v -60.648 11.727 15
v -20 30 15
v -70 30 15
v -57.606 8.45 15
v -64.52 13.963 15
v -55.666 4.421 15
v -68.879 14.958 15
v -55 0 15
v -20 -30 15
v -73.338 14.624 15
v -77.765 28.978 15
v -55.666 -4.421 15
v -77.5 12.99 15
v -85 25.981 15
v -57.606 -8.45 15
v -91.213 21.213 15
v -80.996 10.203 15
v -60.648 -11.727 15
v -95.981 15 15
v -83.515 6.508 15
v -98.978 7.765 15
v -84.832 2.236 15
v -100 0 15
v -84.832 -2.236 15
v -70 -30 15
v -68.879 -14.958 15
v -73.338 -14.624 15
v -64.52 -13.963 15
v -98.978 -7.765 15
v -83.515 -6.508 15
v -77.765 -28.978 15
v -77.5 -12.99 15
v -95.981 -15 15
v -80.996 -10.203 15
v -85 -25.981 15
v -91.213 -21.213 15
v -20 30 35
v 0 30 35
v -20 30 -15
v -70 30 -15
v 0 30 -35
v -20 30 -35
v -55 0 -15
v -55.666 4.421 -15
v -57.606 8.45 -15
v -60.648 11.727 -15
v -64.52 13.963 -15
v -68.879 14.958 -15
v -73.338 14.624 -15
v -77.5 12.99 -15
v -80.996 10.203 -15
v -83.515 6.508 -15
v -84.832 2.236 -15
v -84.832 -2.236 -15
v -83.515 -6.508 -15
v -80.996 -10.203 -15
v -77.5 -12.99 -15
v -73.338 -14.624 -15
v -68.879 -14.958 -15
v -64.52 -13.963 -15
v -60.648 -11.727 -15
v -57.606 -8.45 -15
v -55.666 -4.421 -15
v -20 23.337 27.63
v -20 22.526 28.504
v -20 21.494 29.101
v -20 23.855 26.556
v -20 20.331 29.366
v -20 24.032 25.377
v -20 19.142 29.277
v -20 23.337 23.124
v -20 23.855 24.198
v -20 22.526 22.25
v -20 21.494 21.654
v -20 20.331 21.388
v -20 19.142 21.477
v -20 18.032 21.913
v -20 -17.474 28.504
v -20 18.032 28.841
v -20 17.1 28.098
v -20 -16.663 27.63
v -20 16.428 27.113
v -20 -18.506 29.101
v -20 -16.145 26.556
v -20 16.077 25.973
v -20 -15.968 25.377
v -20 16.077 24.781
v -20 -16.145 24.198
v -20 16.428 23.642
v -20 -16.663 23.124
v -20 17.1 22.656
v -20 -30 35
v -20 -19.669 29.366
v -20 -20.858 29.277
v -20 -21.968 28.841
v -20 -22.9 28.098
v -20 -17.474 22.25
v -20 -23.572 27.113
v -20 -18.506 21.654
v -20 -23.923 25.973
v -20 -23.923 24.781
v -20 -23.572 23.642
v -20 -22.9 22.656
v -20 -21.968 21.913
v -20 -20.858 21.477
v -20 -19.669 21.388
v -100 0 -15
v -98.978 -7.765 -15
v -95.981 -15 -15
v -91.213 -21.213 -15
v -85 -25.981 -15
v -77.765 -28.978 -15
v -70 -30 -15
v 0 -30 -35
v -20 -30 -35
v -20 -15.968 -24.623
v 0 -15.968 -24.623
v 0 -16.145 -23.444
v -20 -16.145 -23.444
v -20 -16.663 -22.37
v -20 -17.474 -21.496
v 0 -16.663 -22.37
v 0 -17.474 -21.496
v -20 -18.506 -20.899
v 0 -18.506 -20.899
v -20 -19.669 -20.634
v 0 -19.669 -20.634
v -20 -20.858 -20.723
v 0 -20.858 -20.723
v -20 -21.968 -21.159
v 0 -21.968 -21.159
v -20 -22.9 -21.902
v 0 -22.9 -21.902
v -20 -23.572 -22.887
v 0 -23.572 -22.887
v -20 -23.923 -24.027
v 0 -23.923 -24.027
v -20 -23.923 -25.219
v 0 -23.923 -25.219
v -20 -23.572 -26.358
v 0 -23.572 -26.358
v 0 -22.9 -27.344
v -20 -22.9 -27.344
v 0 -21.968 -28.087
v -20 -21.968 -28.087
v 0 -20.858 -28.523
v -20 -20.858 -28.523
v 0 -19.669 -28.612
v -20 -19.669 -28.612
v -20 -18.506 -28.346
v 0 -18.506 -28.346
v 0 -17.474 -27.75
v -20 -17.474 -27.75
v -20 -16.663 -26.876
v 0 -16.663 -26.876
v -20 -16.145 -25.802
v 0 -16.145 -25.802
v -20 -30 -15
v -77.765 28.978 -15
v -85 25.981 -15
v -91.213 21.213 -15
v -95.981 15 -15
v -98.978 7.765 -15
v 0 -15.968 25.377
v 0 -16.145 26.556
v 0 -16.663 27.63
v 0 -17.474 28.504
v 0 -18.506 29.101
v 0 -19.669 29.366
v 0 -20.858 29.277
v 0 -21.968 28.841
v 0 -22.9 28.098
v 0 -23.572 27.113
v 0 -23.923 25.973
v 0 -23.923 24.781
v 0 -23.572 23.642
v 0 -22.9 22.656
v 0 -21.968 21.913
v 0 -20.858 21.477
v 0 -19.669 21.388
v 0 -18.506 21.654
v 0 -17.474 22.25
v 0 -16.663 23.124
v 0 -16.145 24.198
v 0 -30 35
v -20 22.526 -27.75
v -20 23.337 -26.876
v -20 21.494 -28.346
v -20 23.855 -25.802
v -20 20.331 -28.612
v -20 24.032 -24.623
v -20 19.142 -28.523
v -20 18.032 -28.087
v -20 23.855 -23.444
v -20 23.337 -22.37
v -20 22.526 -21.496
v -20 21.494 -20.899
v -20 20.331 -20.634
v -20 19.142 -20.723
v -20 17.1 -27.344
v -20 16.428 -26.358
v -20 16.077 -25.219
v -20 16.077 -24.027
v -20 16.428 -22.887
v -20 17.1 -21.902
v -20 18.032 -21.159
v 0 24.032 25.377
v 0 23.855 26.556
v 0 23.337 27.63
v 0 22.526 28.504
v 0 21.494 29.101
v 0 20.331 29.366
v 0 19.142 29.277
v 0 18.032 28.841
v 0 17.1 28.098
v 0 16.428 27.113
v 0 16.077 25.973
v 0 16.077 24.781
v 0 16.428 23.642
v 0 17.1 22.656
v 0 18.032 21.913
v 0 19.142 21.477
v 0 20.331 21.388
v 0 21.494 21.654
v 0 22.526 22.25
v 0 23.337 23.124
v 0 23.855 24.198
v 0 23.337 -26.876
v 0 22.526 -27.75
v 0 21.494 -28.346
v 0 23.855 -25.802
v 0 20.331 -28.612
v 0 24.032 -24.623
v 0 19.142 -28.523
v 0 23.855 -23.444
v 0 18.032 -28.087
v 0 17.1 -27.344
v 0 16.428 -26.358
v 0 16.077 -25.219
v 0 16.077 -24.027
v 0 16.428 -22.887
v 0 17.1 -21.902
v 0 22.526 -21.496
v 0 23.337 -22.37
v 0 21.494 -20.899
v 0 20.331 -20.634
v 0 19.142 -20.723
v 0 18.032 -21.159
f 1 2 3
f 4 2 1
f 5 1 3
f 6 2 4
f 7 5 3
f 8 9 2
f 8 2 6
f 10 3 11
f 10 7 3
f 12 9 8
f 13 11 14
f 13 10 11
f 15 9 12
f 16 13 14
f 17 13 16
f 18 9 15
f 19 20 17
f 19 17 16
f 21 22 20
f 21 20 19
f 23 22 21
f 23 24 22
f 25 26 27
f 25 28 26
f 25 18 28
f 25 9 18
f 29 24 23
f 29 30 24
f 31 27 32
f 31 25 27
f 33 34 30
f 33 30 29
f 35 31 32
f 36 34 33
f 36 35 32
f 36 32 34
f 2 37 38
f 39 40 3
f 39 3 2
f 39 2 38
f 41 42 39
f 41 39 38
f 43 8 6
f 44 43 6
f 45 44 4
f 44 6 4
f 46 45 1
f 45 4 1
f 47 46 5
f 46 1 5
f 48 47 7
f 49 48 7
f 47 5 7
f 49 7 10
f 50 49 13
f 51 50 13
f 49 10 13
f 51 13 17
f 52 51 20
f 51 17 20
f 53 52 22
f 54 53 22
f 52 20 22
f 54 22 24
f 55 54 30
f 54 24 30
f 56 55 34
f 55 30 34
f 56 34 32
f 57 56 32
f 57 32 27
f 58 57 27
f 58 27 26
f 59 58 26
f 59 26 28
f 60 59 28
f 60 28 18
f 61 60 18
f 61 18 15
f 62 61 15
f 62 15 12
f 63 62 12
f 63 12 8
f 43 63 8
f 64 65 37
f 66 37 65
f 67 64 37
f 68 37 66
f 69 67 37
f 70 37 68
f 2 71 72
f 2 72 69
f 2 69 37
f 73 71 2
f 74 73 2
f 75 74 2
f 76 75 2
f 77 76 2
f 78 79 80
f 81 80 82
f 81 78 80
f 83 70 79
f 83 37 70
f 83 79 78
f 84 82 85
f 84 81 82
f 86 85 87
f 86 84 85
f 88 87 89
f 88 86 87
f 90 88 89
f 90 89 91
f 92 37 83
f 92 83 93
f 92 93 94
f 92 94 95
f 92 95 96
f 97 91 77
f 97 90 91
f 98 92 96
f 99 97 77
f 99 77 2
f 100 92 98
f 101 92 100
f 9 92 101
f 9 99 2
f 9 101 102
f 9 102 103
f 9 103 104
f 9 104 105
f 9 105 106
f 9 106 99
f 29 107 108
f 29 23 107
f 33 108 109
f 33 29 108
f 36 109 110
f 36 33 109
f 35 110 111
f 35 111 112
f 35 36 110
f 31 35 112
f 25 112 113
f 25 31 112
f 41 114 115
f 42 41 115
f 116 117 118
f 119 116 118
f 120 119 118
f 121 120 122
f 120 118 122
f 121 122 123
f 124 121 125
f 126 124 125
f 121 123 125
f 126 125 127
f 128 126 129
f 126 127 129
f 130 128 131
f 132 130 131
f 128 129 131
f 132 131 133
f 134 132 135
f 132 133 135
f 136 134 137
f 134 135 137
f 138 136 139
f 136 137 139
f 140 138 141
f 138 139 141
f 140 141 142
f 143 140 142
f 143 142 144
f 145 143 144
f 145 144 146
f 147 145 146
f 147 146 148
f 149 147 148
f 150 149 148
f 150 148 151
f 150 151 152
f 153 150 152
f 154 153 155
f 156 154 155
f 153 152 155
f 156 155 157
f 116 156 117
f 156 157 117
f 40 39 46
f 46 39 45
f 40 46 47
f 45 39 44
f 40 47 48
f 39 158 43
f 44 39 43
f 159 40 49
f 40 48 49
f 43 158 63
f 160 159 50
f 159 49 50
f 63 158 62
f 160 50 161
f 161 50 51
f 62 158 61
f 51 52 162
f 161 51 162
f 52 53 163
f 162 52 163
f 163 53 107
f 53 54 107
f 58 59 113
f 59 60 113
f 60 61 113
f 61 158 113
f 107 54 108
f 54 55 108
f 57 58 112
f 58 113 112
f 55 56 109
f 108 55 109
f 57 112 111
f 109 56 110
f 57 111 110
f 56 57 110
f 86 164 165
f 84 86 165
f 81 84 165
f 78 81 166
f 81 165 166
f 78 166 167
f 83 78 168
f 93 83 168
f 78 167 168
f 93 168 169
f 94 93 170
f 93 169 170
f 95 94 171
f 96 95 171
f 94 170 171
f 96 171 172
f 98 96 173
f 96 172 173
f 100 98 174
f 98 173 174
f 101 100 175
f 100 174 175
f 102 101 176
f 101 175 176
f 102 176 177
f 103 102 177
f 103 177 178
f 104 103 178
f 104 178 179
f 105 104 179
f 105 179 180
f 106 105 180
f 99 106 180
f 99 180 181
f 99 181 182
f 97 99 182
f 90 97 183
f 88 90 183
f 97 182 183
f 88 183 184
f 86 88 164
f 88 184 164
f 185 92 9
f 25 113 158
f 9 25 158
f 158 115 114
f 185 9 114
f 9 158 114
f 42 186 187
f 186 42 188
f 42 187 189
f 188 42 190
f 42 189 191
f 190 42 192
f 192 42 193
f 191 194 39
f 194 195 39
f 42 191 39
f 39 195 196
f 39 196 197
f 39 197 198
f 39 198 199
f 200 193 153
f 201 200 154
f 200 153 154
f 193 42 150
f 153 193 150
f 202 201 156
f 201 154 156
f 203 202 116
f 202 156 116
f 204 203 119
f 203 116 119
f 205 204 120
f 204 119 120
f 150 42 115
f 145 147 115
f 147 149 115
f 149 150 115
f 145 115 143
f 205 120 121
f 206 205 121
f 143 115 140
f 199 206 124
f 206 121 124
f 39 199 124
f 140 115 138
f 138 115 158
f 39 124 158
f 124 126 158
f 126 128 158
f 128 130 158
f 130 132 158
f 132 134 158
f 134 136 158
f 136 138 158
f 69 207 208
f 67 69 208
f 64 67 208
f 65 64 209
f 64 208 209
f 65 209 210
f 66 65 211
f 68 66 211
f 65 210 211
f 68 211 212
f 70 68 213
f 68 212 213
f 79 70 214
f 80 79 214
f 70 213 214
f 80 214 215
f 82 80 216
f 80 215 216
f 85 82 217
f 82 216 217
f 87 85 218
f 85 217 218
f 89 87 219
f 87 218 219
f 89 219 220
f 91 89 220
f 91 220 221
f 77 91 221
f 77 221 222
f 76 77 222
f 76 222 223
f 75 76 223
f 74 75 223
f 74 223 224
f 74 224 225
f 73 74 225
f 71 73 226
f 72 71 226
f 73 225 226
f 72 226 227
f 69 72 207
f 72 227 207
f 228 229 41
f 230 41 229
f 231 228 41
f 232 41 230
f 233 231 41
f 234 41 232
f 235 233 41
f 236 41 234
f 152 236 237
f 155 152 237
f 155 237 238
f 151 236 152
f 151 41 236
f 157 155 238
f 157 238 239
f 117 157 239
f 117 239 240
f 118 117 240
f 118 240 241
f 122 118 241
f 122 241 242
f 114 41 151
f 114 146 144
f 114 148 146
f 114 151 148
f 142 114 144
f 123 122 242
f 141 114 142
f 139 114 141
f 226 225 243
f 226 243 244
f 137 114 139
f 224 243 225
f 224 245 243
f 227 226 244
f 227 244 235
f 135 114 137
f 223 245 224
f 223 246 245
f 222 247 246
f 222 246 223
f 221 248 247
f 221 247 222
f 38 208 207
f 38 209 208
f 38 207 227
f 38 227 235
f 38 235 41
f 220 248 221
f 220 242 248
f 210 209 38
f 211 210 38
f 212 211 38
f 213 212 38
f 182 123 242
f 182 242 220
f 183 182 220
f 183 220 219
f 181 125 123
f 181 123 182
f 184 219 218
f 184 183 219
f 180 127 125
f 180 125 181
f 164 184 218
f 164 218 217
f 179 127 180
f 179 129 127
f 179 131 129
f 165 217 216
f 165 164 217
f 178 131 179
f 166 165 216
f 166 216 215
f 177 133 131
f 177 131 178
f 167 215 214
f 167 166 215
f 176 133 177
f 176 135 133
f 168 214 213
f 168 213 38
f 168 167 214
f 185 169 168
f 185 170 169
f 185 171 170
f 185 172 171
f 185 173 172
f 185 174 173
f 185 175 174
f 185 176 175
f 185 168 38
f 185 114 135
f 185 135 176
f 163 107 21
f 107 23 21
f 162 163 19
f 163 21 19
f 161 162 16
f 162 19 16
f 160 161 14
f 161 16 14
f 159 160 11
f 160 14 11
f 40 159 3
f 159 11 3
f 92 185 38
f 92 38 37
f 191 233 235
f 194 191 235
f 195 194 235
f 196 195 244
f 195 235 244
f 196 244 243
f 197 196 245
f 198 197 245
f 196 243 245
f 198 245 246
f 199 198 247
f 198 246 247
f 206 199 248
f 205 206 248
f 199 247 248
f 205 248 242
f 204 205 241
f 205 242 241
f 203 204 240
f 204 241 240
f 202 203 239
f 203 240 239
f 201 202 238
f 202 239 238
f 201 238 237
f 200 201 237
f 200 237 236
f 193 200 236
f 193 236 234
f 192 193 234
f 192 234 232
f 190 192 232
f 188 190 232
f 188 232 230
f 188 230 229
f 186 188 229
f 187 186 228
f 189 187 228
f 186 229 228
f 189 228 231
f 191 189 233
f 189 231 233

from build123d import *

# Parameters (mm, degrees)
F1_DEPTH = 30
F2_R     = 30
F3_R     = 29.99999
F4_R     = 15
F5_DEPTH = 15
F7_R     = 4
F8_DEPTH = 20


# Not quite as in the source:
# - a fillet or chamfer is up to 0.001 mm smaller than in the source, because OpenCascade refuses the exact size


with BuildPart() as f1:
    # F0 (on Front) → F1 (new body, symmetric)
    with BuildSketch(Plane.XZ):
        Polygon((-100, 0), (0, 0), (0, 35), (-20, 35), (-20, 15), (-100, 15), align=None)
    extrude(amount=F1_DEPTH, both=True)

    # F2
    f2_edges = [f1.edges().sort_by_distance(p)[0] for p in [
        (-100, -30, 7.5),
    ]]
    fillet(f2_edges, radius=F2_R)

    # F3 (radius 30 in the source; OpenCascade refuses exactly that, so slightly less here)
    f3_edges = [f1.edges().sort_by_distance(p)[0] for p in [
        (-100, 30, 7.5),
    ]]
    fillet(f3_edges, radius=F3_R)

    # F4 (on face) → F5 (cut, through all)
    with BuildSketch(Plane.XY.offset(15)):
        with Locations((-70, 0)):
            Circle(F4_R)
    extrude(amount=-F5_DEPTH, mode=Mode.SUBTRACT)

    # F6: F1 across plane


with BuildPart() as f1_1:
    add(f1.part)
    add(f1.part.mirror(Plane.XY))

    # F7 (on Right) → F8 (cut, through all)
    with BuildSketch(Plane.YZ):
        with Locations((-19.9676731229, 25.3771519661)):
            Circle(F7_R)
        with Locations((20.0323268771, 25.3771519661)):
            Circle(F7_R)
        with BuildLine():
            ThreePointArc((-23.9676731229, -24.6228480339), (-19.9676731229, -28.6228480339), (-15.9676731229, -24.6228480339))
            ThreePointArc((-15.9676731229, -24.6228480339), (-19.9676731229, -20.6228480339), (-23.9676731229, -24.6228480339))
        make_face()
        with Locations((20.0323268771, -24.6228480339)):
            Circle(F7_R)
    extrude(amount=-F8_DEPTH, mode=Mode.SUBTRACT)


solid = f1_1.part
